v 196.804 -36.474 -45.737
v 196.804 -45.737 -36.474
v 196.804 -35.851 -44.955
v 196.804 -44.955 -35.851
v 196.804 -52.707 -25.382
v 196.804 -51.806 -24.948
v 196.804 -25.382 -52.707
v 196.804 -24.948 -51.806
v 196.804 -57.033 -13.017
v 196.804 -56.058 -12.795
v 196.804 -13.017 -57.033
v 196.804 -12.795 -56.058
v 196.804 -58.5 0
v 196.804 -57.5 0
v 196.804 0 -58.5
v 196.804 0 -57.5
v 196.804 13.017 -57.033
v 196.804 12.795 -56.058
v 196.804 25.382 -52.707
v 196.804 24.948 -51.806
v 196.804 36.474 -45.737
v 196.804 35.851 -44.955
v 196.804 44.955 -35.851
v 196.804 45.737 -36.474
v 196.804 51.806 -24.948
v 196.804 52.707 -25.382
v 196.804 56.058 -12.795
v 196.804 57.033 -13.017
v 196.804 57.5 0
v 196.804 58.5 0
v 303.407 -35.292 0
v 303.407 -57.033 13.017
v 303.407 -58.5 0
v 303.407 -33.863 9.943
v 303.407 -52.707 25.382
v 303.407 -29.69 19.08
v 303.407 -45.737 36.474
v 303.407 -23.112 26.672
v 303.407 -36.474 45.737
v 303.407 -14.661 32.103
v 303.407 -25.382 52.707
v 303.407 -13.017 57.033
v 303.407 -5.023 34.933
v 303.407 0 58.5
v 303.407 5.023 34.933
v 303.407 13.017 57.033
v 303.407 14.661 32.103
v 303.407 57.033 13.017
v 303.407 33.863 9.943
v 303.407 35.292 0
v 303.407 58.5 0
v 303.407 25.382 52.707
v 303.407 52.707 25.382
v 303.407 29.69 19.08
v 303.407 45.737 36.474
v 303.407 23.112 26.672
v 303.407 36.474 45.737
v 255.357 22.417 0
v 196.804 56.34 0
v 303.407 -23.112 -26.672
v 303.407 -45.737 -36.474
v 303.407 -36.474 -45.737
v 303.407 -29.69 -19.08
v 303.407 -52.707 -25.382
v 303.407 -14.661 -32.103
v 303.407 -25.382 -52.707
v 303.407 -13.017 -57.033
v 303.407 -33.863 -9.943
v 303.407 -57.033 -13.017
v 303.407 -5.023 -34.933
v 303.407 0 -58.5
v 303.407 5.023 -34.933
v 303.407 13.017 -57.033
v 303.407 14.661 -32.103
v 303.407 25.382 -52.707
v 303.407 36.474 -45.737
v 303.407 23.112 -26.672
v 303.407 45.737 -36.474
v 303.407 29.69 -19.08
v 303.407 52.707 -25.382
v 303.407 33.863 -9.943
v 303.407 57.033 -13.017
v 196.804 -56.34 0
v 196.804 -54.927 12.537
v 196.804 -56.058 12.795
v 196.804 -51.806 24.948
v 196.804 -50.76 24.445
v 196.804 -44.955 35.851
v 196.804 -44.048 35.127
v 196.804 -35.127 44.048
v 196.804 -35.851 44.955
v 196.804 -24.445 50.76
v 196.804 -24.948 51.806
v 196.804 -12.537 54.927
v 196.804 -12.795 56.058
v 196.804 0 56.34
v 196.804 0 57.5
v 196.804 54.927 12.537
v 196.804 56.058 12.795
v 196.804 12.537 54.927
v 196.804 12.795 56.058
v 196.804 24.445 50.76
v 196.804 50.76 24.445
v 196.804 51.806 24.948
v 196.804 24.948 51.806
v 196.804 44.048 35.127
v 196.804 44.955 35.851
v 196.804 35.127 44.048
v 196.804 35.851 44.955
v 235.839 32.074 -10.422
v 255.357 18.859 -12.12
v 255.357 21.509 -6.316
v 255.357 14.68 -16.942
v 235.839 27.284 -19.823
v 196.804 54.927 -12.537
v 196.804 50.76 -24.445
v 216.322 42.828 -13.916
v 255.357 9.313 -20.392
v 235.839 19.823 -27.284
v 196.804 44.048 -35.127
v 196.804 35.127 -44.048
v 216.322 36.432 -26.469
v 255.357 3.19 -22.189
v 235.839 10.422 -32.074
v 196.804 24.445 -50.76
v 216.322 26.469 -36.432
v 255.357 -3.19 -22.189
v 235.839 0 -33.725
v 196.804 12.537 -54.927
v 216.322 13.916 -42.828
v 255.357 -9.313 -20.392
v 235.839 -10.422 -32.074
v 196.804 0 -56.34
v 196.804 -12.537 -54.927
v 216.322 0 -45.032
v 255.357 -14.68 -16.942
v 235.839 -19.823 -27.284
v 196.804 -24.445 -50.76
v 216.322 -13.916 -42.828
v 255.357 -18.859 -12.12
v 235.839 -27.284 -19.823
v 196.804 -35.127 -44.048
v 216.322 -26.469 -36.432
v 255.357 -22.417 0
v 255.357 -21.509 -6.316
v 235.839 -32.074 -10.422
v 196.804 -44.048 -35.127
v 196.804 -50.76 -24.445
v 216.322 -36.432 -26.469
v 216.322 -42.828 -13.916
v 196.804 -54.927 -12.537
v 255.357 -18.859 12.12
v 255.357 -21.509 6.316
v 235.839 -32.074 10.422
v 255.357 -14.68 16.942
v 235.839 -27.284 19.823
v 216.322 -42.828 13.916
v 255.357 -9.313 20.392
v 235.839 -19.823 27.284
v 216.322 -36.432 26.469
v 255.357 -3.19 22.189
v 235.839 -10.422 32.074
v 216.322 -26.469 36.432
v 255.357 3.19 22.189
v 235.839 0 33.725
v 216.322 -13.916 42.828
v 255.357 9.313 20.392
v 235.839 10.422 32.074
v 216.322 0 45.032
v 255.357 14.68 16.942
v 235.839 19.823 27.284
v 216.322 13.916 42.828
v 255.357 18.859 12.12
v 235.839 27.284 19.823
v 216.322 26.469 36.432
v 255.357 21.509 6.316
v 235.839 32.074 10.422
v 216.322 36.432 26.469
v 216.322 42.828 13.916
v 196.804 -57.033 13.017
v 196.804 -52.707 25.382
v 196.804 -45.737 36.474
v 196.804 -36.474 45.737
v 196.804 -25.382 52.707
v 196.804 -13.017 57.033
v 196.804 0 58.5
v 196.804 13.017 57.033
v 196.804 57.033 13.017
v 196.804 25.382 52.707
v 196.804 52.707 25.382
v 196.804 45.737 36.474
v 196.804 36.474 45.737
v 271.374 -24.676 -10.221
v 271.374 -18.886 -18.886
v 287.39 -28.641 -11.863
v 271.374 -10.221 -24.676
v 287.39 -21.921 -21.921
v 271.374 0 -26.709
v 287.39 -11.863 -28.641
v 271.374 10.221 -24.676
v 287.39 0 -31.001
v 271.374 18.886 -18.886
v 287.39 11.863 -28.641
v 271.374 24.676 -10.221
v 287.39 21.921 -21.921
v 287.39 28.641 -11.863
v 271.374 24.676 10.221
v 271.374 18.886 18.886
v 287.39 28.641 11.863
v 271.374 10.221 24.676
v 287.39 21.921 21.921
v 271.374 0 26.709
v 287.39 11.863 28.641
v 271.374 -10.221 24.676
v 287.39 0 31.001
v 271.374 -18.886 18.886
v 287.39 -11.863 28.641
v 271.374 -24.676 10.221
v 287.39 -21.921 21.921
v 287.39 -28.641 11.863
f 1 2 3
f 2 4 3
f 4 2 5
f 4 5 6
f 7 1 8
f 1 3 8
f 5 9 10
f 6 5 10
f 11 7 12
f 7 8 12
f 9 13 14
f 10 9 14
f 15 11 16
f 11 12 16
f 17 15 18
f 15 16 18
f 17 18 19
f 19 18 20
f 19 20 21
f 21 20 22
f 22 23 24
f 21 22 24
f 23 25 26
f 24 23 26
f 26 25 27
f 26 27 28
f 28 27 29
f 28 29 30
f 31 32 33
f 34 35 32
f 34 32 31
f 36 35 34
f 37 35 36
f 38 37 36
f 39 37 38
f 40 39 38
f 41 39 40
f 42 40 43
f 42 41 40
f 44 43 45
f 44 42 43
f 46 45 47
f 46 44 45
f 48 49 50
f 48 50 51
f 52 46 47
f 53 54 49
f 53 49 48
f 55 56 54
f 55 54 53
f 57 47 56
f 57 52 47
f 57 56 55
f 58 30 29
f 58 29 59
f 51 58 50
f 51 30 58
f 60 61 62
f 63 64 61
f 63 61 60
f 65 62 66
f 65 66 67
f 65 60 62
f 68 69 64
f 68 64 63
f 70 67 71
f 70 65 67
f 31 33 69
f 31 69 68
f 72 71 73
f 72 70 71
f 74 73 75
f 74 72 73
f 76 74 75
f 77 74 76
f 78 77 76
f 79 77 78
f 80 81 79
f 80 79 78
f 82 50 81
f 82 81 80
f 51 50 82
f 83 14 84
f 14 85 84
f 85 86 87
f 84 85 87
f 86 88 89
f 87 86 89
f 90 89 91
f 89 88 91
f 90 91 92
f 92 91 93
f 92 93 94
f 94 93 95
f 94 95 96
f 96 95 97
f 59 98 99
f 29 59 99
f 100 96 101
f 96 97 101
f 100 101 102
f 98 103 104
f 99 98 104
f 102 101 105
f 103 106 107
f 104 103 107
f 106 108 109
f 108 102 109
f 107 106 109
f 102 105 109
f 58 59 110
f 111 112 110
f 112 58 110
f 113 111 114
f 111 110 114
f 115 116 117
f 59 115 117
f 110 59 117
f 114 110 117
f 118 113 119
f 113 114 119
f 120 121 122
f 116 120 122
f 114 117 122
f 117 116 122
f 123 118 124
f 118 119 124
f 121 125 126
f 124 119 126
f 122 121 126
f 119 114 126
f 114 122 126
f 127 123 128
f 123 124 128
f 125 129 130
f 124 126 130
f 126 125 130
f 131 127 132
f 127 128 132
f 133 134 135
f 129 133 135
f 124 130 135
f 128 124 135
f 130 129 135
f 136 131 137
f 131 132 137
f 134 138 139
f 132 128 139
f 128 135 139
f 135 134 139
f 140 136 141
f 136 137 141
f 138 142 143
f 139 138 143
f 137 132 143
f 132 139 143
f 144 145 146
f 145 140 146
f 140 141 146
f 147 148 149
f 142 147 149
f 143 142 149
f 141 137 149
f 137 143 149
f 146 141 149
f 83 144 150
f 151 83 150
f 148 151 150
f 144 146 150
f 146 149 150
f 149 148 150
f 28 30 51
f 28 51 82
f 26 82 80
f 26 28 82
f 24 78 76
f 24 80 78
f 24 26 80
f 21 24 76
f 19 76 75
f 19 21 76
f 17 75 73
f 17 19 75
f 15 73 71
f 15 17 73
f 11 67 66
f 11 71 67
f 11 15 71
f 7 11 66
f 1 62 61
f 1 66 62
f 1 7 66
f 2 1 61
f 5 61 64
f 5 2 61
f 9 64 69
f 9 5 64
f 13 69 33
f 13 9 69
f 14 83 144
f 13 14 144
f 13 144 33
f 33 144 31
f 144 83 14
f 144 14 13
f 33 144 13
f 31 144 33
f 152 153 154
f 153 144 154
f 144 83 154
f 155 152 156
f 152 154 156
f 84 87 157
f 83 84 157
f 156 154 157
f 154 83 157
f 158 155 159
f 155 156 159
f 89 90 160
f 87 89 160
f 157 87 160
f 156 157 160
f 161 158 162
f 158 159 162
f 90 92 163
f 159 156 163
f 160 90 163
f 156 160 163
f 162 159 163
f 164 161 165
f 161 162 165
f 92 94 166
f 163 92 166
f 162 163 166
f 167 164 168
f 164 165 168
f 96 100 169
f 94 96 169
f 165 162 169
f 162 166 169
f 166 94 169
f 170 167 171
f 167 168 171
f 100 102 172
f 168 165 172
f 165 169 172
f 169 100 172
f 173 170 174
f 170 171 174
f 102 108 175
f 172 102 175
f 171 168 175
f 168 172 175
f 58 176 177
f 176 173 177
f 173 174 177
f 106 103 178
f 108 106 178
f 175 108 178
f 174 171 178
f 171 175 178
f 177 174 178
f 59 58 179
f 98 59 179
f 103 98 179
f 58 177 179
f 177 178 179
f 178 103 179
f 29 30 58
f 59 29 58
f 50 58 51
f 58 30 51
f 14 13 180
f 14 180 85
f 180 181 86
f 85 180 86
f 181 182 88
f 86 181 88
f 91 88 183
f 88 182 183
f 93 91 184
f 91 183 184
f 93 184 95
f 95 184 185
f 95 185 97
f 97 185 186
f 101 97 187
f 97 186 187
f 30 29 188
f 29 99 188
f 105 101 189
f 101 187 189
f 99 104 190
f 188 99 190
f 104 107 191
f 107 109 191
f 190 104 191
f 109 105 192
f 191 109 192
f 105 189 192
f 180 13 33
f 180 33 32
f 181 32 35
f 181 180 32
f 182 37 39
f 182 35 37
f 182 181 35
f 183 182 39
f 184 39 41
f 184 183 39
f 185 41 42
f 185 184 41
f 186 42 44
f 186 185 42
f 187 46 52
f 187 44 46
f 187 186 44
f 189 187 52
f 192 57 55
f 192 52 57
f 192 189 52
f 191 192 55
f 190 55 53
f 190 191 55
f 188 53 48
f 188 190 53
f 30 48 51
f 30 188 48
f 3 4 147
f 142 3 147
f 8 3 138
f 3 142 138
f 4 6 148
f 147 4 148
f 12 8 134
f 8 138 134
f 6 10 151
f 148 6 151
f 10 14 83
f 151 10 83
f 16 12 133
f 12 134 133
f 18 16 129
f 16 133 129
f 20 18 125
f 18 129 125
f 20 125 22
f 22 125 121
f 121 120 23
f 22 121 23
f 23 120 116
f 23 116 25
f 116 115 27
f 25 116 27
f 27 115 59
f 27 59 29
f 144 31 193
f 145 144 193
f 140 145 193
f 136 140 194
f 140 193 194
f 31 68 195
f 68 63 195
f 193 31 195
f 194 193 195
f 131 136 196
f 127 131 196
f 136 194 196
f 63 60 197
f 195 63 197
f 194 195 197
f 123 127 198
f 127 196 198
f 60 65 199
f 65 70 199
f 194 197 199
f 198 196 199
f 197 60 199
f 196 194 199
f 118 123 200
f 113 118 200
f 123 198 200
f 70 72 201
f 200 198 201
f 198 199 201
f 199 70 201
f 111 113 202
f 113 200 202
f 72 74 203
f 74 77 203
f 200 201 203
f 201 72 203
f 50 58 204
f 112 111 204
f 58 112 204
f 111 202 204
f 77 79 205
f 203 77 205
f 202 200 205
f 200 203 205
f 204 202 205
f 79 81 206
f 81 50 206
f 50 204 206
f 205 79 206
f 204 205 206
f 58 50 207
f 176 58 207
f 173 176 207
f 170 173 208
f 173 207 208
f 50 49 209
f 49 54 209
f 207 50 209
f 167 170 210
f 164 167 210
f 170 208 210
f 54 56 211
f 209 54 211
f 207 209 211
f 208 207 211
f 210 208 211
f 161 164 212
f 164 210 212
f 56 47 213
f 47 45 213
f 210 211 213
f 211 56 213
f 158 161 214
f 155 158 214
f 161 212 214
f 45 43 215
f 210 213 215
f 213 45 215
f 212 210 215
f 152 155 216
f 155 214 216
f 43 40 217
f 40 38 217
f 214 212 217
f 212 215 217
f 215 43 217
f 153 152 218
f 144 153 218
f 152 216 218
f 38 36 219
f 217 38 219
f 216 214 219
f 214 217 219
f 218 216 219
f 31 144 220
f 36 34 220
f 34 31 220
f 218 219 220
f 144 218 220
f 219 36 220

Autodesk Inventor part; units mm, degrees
ref_plane "YZ Plane" through (0, 0, 0) normal (1, 0, 0) x (0, 1, 0)
ref_plane "XZ Plane" through (0, 0, 0) normal (0, 1, 0) x (-1, 0, 0)
sketch "Sketch3" plane through (0, 0, 0) normal (0, 0, 1) x (1, 0, 0)
  line L0 (0, 54.5) -> (192, 54.5)
  line L1 (254.7886, 18.124) -> (254.7886, 0) construction
  line L2 (192, 54.5) -> (254.7886, 18.124)
  line L3 (254.7886, 18.124) -> (325.1228, 36.97)
  line L4 (254.7886, 18.124) -> (254.7886, 43.3259) construction
  line L5 (0, 0) -> (254.7886, 0)
  line L6 (325.1228, 36.97) -> (325.1228, 0)
  line L7 (192, 54.5) -> (254.7886, 18.124)
  line L8 (325.1228, 0) -> (305.1228, 0)
  line L9 (-65.0246, 0) -> (390.1474, 0)
  line L10 (0, 57.5) -> (192, 57.5)
  line L11 (193.5039, 57.0958) -> (255.2149, 21.3441)
  line L12 (255.2149, 21.3441) -> (325.1228, 40.0758)
  line L13 (325.1228, 36.97) -> (325.1228, 40.0758)
  line L14 (0, 54.5) -> (0, 57.5)
  line L15 (193.5039, 57.0958) -> (192.8038, 57.5)
  line L16 (193.5039, 57.0958) -> (200.0085, 57.0958) construction
  line L17 (192, 57.5) -> (192.8038, 57.5)
  line L18 (325.1228, 40.0758) -> (325.1228, 57.5)
  line L19 (317.1228, 57.5) -> (317.1228, 37.9322)
  line L20 (325.1228, 0) -> (325.1228, 58.5)
  line L21 (317.1228, 58.5) -> (317.1228, 57.5)
  line L22 (317.1228, 58.5) -> (325.1228, 58.5)
  line L23 (317.1228, 58.5) -> (155.0777, 58.5)
  line L24 (192, 57.5) -> (192, 71.51)
  line L25 (192, 57.5) -> (206.01, 57.5) construction
  line L26 (192.8038, 57.5) -> (192.8038, 62.5821)
  line L27 (196.8038, 57.5) -> (196.8038, 62.5821)
  line L28 (196.8038, 57.5) -> (196.8038, 54.0674)
  line L29 (317.1228, 58.5) -> (303.4068, 58.5)
  line L30 (303.4068, 58.5) -> (303.4068, 12.5113)
  line L31 (324.864, 41.0418) -> (255.3571, 22.4174)
  line L32 (255.3571, 22.4174) -> (194.0045, 57.9615)
  line L33 (194.0045, 57.9615) -> (193.3038, 58.366)
  point P0 (327.1228, 40.0758)
  point P1 (254.7886, 31.9804)
  point P2 (325.1228, 59.5)
  point P3 (321.1228, 58.5)
  point P4 (196.8038, 56.3397)
  point P5 (303.4068, 35.2923)
  point P6 (196.8038, 58.5)
  dimension "d102" = 18.124
  dimension "d103" = 54.5
  dimension "d104" = 192
  dimension "d105" = 20
  dimension "d106" = 3
  dimension "d107" = 3
  dimension "d108" = 3
  dimension "d109" = 150
  dimension "d110" = 8
  dimension "d111" = 58.5
  dimension "d112" = 90
  dimension "d113" = 4
  dimension "d114" = 13.716
  dimension "d115" = 1
revolve "Revolution2" add sketch "Sketch3" angle 360 about axis through (-65.0246, 0, 0) along (1, 0, 0) contours L31 L32 L28 L27 L23 L30
ref_plane "Work Plane2" through (0, 0, 59.5) normal (0, 0, 1) x (1, 0, 0)
split body "Split6" result two bodies by plane through (0, 0, 0) normal (0, 0, 1) first body at (232.3382, -57.5604, 7.1275)
properties part number "stainless steel space" material "Aluminum 6061"
